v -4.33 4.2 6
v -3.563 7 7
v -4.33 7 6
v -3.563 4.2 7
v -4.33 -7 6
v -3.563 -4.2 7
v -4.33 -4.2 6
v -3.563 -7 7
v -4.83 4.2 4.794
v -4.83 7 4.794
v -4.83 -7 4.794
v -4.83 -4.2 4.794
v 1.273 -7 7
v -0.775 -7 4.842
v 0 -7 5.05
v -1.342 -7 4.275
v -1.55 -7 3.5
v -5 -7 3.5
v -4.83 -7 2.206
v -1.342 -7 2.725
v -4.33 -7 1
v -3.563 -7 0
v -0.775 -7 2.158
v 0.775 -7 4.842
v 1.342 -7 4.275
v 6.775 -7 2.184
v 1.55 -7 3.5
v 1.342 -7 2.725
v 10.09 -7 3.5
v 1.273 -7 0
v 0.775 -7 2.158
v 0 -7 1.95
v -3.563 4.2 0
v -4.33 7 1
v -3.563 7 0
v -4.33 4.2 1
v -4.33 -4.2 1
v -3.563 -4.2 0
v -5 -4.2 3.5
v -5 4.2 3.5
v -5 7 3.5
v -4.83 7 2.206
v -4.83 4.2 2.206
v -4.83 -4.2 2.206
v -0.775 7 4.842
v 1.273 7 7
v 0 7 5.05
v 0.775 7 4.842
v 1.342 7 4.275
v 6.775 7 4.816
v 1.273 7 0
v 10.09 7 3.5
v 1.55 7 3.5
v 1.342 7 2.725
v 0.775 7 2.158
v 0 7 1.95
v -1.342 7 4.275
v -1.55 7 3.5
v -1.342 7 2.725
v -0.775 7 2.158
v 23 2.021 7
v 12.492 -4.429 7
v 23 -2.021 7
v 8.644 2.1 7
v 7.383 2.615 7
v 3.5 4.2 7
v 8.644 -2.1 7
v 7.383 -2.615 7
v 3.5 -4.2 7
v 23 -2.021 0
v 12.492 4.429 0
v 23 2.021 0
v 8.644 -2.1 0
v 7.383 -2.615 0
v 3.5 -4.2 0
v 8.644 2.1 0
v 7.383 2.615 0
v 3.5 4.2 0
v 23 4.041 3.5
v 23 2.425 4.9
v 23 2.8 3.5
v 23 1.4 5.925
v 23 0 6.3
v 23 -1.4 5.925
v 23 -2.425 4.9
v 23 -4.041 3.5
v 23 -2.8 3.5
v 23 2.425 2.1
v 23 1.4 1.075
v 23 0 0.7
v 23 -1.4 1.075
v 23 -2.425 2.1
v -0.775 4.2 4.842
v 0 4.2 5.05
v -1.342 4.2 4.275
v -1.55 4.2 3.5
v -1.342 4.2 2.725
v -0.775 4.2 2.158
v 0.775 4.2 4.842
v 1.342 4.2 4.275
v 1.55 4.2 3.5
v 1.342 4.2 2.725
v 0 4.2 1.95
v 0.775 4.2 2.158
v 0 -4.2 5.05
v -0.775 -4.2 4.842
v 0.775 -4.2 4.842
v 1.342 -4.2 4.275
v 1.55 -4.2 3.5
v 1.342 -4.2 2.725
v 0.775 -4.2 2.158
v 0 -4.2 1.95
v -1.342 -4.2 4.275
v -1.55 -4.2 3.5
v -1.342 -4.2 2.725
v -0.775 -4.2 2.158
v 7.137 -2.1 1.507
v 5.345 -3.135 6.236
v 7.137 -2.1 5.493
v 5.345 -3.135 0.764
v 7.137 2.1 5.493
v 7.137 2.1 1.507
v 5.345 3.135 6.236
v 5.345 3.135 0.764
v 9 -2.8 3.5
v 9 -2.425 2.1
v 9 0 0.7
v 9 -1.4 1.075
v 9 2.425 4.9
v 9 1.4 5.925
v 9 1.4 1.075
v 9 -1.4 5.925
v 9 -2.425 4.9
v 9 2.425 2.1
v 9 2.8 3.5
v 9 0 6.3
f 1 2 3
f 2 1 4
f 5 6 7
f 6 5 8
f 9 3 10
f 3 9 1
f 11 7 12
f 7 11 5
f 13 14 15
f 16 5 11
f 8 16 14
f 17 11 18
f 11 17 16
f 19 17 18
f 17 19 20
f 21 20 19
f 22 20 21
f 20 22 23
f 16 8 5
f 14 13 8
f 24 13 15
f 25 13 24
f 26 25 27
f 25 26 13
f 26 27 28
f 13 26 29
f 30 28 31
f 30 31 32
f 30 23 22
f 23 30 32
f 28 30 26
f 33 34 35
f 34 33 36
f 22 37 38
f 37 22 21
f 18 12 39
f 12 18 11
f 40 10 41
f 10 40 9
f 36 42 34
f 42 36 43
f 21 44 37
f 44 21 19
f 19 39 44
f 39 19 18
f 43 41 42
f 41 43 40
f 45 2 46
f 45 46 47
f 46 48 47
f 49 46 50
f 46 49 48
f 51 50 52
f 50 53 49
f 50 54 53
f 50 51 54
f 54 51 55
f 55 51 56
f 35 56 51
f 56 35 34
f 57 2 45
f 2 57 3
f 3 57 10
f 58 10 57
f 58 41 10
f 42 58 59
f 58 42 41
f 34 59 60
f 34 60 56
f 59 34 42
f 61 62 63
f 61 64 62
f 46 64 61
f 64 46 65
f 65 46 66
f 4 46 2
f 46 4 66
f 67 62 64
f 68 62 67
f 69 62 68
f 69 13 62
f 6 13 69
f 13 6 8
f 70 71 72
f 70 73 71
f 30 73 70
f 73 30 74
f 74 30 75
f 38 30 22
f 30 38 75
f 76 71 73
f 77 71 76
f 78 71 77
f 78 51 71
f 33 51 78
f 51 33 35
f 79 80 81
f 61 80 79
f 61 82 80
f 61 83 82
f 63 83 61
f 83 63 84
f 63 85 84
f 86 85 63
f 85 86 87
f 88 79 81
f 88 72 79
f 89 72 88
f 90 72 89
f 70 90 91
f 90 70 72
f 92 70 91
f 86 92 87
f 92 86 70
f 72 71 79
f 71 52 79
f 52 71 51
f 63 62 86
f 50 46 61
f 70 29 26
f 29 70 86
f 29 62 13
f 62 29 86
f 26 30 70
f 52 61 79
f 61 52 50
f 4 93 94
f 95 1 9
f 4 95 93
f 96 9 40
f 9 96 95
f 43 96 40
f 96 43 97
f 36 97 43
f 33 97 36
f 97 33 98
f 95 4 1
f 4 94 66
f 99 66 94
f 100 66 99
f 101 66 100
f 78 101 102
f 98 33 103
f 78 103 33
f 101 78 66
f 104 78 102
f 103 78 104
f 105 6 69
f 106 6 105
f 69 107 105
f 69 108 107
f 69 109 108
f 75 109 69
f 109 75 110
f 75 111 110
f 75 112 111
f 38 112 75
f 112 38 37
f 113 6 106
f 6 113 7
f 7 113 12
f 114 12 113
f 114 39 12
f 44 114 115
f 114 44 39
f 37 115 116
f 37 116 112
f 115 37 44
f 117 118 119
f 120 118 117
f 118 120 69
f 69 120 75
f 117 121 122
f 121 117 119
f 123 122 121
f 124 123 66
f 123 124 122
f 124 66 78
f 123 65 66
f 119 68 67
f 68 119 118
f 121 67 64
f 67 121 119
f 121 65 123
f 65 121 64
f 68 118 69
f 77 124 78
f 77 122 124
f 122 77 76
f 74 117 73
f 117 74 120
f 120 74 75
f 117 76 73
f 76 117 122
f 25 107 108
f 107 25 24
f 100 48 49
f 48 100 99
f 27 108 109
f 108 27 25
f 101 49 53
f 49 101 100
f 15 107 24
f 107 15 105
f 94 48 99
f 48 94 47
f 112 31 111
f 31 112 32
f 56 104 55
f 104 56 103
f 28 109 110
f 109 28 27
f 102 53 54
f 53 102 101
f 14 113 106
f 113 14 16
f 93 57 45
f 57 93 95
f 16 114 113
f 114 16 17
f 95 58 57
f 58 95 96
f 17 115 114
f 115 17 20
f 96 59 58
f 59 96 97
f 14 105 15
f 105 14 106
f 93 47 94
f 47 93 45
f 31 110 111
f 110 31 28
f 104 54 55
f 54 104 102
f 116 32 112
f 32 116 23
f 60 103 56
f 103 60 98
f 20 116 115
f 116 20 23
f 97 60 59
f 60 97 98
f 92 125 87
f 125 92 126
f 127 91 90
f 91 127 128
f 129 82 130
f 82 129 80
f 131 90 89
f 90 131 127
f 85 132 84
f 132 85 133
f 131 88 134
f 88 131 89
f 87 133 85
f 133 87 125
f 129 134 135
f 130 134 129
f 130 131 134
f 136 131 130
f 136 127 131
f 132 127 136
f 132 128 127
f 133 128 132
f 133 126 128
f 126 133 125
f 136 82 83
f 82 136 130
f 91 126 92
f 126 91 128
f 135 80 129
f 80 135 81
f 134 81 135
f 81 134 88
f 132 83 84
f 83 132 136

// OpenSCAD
h = 7;
r = h/2 / cos(30);
rod_diam = 5.6;

module jaws() {
  difference() {
    union() {
      intersection () {
        rotate([90, 0, 0]) cylinder(r=5, h=14, center=true, $fn=24);
        translate([-4, 0, 0]) cube([10, 14, h], center=true);
      }
      intersection() {
        translate([10, 0, 0]) cube([26, 14, h], center=true);
        translate([10, 0, 0]) rotate([0, 90, 0]) rotate([0, 0, 30])
          cylinder(r1=10, r2=r, h=26, center=true, $fn=6);
      }
    }
    translate([-1.5, 0, 0]) cube([10, 8.4, 10], center=true);
    translate([3.5, 0, 0]) rotate([0, 0, 30])
      cylinder(r=4.2, h=10, center=true, $fn=6);
    translate([4, 0, 4]) rotate([0, 45, 0])
      rotate([0, 0, 30]) cylinder(r=4.2, h=8, center=true, $fn=6);
    translate([4, 0, -4]) rotate([0, -45, 0])
      rotate([0, 0, 30]) cylinder(r=4.2, h=8, center=true, $fn=6);
    rotate([90, 0, 0]) cylinder(r=1.55, h=40, center=true, $fn=12);
    // Rod hole
    translate([19, 0, 0]) rotate([0, 90, 0])
      cylinder(r=rod_diam/2, h=20, center=true, $fn=12);
  }
}

translate([0, 0, h/2]) jaws();
